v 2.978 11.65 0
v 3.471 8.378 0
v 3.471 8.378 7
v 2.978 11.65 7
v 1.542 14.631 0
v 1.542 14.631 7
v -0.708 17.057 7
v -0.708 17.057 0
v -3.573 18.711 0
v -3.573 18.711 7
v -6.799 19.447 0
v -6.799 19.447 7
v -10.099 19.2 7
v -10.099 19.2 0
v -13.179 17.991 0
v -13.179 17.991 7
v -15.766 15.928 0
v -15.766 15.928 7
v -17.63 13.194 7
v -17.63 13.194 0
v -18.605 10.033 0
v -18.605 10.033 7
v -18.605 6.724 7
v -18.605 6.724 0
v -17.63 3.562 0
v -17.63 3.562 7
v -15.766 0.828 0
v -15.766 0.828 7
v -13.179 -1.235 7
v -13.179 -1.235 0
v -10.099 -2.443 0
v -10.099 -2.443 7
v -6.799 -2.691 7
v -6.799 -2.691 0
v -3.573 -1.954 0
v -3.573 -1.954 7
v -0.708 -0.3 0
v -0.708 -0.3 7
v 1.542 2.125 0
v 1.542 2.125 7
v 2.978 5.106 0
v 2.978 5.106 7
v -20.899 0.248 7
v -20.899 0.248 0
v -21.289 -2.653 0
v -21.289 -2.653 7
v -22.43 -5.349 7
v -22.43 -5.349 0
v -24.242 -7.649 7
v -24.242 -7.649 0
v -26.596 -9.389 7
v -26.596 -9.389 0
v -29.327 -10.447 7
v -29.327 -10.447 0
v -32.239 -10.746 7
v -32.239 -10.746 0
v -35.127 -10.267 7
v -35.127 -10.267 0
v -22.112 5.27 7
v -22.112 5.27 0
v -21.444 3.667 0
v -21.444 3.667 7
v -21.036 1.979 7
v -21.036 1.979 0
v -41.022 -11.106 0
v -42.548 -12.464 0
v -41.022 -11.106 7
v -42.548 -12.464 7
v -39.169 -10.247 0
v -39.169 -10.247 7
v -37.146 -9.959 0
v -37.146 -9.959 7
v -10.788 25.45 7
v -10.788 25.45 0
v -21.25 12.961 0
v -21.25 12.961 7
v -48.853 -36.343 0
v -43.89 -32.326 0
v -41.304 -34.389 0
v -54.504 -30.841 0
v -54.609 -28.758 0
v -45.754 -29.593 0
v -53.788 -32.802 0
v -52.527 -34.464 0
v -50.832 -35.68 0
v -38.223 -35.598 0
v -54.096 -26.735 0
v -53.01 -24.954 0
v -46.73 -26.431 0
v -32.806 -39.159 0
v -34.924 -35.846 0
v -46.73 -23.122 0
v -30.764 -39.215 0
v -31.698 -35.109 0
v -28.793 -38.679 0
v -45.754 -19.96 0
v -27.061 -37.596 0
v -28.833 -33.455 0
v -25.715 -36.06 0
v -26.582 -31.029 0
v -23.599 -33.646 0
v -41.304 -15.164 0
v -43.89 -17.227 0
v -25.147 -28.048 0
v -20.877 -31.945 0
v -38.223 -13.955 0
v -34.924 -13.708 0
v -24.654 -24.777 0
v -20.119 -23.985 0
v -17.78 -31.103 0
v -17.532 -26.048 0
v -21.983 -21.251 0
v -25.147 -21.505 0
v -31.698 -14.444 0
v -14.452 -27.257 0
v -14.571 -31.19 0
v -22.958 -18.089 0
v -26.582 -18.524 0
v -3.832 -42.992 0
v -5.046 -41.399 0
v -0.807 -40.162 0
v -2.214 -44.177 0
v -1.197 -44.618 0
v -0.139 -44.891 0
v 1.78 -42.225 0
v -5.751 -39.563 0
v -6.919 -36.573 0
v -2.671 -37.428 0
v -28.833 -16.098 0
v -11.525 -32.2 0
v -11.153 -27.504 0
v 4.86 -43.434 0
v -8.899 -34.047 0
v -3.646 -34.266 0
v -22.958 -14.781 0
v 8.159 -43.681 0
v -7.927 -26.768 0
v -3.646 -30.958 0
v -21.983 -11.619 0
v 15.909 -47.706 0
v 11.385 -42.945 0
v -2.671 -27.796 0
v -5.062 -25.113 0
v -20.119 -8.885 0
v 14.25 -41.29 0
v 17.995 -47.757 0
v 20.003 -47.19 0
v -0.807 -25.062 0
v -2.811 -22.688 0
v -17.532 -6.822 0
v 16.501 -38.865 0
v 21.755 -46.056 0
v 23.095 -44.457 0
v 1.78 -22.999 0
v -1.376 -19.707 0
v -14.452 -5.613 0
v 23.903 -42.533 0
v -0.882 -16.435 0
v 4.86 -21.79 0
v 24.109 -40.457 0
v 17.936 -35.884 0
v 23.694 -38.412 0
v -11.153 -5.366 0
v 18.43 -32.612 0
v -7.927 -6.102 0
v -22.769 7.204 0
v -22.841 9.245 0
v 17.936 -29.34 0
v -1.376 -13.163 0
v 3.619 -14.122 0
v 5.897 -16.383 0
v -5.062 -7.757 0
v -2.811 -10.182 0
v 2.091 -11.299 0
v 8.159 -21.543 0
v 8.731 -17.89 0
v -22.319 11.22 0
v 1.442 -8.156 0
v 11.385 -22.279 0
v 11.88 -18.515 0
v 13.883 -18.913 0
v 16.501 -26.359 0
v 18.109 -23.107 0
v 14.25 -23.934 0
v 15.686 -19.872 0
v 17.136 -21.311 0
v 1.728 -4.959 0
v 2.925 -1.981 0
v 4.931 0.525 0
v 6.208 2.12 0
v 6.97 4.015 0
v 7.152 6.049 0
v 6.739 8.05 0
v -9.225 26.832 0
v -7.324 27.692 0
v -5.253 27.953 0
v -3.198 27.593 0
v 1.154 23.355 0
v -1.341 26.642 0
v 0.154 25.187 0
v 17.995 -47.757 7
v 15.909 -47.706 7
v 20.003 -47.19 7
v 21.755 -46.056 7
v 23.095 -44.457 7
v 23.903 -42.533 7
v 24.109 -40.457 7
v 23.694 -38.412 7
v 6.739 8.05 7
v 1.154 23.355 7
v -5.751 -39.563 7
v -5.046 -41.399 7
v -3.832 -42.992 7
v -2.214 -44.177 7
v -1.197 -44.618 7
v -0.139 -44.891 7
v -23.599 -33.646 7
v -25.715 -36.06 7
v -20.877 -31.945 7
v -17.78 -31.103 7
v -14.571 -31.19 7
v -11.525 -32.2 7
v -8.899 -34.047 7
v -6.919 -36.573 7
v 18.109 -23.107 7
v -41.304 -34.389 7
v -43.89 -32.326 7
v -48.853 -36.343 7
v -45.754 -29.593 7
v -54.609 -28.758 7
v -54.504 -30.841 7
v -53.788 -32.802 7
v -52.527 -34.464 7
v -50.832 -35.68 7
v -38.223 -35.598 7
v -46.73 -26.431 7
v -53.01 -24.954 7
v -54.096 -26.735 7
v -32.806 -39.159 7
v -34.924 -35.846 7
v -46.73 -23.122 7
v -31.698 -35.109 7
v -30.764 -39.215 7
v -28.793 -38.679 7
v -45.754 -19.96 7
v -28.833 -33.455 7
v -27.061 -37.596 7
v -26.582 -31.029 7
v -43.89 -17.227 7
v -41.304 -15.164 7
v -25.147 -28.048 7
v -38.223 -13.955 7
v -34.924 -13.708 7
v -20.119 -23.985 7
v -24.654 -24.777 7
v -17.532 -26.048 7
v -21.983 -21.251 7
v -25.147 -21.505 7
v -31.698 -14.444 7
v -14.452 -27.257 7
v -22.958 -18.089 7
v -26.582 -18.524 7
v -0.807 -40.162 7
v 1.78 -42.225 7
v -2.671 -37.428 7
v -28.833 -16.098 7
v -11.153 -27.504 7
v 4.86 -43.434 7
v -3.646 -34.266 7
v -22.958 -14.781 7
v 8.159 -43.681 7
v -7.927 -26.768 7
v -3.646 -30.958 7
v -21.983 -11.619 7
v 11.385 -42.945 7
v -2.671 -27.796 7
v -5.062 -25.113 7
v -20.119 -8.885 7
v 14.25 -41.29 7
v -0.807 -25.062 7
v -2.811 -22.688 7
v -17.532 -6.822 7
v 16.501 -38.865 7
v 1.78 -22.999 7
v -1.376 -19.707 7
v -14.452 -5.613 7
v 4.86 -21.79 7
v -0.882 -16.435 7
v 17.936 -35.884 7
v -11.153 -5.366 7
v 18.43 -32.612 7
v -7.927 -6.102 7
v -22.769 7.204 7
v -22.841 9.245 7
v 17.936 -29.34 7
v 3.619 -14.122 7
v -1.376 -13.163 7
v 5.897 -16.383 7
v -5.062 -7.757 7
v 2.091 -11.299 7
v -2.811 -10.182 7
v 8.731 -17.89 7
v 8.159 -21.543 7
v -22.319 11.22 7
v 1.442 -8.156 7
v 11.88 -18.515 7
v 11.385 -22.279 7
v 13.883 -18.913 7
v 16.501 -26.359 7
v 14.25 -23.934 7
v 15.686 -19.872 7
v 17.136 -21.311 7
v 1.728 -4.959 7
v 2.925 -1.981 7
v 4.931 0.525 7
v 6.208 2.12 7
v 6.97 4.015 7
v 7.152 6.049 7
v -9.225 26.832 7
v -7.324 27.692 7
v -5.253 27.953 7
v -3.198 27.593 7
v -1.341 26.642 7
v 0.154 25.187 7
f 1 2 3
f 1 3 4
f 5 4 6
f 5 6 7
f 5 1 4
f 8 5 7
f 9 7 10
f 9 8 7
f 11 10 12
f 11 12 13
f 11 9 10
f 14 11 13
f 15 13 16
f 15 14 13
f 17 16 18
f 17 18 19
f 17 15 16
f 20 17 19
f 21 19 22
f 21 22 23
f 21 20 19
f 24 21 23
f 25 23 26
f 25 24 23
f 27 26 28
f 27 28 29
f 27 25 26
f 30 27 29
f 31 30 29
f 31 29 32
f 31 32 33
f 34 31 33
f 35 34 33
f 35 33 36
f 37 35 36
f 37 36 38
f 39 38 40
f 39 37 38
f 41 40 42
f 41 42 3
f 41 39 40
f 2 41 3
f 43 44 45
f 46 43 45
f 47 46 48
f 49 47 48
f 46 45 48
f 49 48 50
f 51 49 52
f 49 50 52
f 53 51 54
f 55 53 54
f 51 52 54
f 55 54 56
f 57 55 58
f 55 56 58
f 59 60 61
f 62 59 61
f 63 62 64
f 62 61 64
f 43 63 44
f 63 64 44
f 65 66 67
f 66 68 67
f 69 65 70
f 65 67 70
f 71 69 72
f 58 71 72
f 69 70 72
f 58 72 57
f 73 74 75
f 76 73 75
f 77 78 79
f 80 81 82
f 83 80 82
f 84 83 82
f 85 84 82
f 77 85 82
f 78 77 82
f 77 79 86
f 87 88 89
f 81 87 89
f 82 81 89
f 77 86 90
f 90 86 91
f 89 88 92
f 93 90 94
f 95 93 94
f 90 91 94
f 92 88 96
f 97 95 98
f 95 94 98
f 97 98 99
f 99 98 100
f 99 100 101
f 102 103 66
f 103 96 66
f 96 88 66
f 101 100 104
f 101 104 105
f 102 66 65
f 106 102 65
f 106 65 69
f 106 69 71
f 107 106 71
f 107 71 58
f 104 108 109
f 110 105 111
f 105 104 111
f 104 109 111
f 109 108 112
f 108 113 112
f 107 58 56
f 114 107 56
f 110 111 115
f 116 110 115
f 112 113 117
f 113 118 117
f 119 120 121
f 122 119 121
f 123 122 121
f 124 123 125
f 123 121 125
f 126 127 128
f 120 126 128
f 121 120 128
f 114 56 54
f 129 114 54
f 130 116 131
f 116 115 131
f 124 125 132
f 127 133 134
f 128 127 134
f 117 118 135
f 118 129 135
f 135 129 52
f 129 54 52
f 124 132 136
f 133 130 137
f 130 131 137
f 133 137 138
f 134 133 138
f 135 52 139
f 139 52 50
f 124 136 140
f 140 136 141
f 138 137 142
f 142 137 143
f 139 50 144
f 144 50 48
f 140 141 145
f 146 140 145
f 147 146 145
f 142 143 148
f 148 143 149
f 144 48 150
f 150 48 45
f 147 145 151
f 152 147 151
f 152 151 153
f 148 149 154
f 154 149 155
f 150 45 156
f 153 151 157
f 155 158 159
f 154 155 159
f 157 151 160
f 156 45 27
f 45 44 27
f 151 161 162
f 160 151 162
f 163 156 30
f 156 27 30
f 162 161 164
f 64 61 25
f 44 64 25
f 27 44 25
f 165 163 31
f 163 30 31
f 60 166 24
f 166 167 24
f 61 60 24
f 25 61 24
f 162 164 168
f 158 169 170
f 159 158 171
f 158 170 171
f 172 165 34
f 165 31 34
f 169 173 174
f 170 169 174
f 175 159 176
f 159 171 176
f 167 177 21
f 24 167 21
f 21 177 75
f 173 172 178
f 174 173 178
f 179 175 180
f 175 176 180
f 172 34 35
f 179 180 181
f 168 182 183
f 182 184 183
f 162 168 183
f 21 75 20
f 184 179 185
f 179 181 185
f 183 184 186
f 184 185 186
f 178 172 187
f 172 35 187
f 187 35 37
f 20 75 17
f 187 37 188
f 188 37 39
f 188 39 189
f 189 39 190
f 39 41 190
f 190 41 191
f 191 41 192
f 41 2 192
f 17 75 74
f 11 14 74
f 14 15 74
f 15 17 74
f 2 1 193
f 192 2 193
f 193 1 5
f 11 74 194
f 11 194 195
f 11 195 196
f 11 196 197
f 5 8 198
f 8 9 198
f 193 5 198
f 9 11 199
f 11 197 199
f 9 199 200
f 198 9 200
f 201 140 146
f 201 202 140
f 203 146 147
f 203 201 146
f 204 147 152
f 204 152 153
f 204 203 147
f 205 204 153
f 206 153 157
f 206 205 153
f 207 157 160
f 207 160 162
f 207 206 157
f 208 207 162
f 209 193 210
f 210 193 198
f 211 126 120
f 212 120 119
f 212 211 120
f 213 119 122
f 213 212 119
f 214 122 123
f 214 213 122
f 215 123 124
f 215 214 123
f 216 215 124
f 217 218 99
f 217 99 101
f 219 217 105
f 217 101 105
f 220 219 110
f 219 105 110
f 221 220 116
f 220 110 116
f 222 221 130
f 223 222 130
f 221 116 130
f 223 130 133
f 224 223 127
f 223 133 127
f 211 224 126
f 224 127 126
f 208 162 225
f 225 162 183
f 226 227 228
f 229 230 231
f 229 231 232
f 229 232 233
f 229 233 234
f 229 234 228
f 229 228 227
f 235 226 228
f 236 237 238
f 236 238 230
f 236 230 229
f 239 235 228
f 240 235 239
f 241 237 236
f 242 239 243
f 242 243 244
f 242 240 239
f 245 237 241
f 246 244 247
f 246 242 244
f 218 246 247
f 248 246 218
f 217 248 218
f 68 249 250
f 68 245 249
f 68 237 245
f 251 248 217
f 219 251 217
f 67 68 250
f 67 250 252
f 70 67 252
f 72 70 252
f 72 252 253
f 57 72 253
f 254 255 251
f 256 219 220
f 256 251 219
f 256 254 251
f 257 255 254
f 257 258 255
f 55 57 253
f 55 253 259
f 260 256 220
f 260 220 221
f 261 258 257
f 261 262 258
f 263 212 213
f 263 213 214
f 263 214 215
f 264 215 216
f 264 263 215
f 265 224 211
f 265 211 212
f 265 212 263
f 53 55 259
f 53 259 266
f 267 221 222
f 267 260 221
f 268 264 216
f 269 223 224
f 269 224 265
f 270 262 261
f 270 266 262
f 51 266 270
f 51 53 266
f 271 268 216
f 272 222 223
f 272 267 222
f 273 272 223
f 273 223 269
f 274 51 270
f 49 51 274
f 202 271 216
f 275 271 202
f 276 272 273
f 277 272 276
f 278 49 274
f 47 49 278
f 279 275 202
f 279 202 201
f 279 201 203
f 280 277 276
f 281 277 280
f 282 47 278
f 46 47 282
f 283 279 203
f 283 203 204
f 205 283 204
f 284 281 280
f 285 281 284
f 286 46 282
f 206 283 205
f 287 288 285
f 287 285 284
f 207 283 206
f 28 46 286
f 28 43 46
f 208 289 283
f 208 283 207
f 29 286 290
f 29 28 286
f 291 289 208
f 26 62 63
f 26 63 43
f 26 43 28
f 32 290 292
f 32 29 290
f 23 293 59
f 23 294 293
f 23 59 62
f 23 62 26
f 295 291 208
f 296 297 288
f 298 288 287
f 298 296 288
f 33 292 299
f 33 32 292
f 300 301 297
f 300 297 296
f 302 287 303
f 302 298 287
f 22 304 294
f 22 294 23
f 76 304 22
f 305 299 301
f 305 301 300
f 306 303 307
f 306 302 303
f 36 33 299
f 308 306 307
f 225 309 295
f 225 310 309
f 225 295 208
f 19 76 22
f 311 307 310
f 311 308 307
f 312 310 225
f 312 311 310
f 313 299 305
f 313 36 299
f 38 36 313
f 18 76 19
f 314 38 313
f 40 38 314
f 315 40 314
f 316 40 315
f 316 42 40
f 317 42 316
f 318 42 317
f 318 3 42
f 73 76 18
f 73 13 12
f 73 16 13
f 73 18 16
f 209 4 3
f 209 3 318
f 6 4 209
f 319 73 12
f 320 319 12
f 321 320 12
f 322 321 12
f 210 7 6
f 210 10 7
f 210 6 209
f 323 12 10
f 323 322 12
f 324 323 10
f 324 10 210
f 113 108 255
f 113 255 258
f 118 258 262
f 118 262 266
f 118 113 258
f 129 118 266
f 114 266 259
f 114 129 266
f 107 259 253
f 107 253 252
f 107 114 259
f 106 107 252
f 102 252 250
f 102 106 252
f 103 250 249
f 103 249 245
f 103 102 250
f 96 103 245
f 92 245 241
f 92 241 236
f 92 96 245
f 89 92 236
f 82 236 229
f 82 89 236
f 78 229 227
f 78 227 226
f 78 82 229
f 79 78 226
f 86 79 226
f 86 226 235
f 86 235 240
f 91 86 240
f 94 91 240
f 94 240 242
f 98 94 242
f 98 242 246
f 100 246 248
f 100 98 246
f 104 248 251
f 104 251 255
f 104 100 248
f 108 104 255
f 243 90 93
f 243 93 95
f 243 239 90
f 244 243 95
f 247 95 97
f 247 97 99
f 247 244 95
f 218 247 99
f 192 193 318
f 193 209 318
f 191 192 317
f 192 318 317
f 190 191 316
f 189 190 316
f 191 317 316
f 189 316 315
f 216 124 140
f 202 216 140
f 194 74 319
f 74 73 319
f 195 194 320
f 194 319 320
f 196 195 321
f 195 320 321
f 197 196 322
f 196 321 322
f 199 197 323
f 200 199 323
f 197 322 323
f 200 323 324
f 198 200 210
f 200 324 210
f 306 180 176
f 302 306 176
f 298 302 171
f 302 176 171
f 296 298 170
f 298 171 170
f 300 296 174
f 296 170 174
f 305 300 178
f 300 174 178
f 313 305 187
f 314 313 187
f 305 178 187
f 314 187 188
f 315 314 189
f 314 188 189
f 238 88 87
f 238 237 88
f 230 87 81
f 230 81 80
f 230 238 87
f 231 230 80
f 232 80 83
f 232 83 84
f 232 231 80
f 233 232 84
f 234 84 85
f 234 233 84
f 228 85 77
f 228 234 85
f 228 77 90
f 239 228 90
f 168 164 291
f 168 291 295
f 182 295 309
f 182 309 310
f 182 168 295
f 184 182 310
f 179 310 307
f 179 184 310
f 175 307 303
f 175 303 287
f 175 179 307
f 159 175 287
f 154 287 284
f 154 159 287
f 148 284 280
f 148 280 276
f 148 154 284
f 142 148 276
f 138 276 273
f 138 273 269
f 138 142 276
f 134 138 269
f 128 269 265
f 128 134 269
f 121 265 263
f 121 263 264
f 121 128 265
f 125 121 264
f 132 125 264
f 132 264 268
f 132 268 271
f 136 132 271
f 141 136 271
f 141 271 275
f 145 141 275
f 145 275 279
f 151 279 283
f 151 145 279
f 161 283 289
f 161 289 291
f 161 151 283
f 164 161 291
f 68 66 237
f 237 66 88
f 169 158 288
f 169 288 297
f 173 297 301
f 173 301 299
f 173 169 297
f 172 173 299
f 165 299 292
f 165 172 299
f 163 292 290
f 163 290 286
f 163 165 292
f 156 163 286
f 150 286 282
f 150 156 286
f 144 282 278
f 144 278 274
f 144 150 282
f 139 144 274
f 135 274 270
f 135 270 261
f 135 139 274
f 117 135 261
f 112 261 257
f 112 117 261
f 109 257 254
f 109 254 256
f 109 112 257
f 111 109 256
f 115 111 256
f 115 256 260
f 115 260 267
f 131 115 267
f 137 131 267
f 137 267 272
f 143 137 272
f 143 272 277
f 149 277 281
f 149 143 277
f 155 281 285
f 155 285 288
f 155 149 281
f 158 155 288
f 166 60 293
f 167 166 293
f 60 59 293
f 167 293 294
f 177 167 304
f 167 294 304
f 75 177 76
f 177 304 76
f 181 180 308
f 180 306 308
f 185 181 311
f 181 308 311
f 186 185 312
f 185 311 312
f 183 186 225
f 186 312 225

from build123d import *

# Parameters (mm, degrees)
F0_R     = 11.1
F1_DEPTH = 7
F2_R     = 7


with BuildPart() as f1:
    # F0 (on Top) → F1 (new body)
    with BuildSketch(Plane.XY):
        with BuildLine():
            Line((-38.9624627261, -8.1840724655), (-60.7952496686, -34.2480210213))
            Line((-60.7952496686, -34.2480210213), (-27.306814625, -40.123794871))
            ThreePointArc((-27.306814625, -40.123794871), (-15.5182325204, -31.0662352189), (-5.4723209344, -42.0247805283))
            ThreePointArc((-5.4723209344, -42.0247805283), (-5.5137756251, -42.9788689424), (-5.6378272439, -43.9257661855))
            Line((-5.6378272439, -43.9257661855), (27.8506077997, -49.8015400352))
            Line((27.8506077997, -49.8015400352), (16.1949596986, -17.8618176297))
            ThreePointArc((16.1949596986, -17.8618176297), (2.090575123, -11.2993230017), (8.6530697509, 2.8050615739))
            Line((8.6530697509, 2.8050615739), (-3.0025783502, 34.7447839795))
            Line((-3.0025783502, 34.7447839795), (-24.8353652927, 8.6808354236))
            ThreePointArc((-24.8353652927, 8.6808354236), (-21.9314911759, 4.9013893297), (-20.8989140094, 0.2483814791))
            ThreePointArc((-20.8989140094, 0.2483814791), (-27.2459061587, -9.7190413544), (-38.9624627261, -8.1840724655))
        make_face()
        with Locations((-35.7535122499, -24.7765792781)):
            Circle(F0_R, mode=Mode.SUBTRACT)
        with Locations((7.3296251626, -32.6118866408)):
            Circle(F0_R, mode=Mode.SUBTRACT)
        with Locations((-11.9824067397, -16.4349256924)):
            Circle(F0_R, mode=Mode.SUBTRACT)
        with Locations((-7.6287635535, 8.378265008)):
            Circle(F0_R, mode=Mode.SUBTRACT)
    extrude(amount=F1_DEPTH)

    # F2
    f2_edges = [f1.edges().sort_by_distance(p)[0] for p in [
        (-3.002578, 34.744784, 3.5),
        (-24.835365, 8.680835, 3.5),
        (-38.962463, -8.184072, 3.5),
        (-60.79525, -34.248021, 3.5),
        (-27.306815, -40.123795, 3.5),
        (-5.637827, -43.925766, 3.5),
        (16.19496, -17.861818, 3.5),
        (8.65307, 2.805062, 3.5),
        (27.850608, -49.80154, 3.5),
    ]]
    fillet(f2_edges, radius=F2_R)


solid = f1.part
